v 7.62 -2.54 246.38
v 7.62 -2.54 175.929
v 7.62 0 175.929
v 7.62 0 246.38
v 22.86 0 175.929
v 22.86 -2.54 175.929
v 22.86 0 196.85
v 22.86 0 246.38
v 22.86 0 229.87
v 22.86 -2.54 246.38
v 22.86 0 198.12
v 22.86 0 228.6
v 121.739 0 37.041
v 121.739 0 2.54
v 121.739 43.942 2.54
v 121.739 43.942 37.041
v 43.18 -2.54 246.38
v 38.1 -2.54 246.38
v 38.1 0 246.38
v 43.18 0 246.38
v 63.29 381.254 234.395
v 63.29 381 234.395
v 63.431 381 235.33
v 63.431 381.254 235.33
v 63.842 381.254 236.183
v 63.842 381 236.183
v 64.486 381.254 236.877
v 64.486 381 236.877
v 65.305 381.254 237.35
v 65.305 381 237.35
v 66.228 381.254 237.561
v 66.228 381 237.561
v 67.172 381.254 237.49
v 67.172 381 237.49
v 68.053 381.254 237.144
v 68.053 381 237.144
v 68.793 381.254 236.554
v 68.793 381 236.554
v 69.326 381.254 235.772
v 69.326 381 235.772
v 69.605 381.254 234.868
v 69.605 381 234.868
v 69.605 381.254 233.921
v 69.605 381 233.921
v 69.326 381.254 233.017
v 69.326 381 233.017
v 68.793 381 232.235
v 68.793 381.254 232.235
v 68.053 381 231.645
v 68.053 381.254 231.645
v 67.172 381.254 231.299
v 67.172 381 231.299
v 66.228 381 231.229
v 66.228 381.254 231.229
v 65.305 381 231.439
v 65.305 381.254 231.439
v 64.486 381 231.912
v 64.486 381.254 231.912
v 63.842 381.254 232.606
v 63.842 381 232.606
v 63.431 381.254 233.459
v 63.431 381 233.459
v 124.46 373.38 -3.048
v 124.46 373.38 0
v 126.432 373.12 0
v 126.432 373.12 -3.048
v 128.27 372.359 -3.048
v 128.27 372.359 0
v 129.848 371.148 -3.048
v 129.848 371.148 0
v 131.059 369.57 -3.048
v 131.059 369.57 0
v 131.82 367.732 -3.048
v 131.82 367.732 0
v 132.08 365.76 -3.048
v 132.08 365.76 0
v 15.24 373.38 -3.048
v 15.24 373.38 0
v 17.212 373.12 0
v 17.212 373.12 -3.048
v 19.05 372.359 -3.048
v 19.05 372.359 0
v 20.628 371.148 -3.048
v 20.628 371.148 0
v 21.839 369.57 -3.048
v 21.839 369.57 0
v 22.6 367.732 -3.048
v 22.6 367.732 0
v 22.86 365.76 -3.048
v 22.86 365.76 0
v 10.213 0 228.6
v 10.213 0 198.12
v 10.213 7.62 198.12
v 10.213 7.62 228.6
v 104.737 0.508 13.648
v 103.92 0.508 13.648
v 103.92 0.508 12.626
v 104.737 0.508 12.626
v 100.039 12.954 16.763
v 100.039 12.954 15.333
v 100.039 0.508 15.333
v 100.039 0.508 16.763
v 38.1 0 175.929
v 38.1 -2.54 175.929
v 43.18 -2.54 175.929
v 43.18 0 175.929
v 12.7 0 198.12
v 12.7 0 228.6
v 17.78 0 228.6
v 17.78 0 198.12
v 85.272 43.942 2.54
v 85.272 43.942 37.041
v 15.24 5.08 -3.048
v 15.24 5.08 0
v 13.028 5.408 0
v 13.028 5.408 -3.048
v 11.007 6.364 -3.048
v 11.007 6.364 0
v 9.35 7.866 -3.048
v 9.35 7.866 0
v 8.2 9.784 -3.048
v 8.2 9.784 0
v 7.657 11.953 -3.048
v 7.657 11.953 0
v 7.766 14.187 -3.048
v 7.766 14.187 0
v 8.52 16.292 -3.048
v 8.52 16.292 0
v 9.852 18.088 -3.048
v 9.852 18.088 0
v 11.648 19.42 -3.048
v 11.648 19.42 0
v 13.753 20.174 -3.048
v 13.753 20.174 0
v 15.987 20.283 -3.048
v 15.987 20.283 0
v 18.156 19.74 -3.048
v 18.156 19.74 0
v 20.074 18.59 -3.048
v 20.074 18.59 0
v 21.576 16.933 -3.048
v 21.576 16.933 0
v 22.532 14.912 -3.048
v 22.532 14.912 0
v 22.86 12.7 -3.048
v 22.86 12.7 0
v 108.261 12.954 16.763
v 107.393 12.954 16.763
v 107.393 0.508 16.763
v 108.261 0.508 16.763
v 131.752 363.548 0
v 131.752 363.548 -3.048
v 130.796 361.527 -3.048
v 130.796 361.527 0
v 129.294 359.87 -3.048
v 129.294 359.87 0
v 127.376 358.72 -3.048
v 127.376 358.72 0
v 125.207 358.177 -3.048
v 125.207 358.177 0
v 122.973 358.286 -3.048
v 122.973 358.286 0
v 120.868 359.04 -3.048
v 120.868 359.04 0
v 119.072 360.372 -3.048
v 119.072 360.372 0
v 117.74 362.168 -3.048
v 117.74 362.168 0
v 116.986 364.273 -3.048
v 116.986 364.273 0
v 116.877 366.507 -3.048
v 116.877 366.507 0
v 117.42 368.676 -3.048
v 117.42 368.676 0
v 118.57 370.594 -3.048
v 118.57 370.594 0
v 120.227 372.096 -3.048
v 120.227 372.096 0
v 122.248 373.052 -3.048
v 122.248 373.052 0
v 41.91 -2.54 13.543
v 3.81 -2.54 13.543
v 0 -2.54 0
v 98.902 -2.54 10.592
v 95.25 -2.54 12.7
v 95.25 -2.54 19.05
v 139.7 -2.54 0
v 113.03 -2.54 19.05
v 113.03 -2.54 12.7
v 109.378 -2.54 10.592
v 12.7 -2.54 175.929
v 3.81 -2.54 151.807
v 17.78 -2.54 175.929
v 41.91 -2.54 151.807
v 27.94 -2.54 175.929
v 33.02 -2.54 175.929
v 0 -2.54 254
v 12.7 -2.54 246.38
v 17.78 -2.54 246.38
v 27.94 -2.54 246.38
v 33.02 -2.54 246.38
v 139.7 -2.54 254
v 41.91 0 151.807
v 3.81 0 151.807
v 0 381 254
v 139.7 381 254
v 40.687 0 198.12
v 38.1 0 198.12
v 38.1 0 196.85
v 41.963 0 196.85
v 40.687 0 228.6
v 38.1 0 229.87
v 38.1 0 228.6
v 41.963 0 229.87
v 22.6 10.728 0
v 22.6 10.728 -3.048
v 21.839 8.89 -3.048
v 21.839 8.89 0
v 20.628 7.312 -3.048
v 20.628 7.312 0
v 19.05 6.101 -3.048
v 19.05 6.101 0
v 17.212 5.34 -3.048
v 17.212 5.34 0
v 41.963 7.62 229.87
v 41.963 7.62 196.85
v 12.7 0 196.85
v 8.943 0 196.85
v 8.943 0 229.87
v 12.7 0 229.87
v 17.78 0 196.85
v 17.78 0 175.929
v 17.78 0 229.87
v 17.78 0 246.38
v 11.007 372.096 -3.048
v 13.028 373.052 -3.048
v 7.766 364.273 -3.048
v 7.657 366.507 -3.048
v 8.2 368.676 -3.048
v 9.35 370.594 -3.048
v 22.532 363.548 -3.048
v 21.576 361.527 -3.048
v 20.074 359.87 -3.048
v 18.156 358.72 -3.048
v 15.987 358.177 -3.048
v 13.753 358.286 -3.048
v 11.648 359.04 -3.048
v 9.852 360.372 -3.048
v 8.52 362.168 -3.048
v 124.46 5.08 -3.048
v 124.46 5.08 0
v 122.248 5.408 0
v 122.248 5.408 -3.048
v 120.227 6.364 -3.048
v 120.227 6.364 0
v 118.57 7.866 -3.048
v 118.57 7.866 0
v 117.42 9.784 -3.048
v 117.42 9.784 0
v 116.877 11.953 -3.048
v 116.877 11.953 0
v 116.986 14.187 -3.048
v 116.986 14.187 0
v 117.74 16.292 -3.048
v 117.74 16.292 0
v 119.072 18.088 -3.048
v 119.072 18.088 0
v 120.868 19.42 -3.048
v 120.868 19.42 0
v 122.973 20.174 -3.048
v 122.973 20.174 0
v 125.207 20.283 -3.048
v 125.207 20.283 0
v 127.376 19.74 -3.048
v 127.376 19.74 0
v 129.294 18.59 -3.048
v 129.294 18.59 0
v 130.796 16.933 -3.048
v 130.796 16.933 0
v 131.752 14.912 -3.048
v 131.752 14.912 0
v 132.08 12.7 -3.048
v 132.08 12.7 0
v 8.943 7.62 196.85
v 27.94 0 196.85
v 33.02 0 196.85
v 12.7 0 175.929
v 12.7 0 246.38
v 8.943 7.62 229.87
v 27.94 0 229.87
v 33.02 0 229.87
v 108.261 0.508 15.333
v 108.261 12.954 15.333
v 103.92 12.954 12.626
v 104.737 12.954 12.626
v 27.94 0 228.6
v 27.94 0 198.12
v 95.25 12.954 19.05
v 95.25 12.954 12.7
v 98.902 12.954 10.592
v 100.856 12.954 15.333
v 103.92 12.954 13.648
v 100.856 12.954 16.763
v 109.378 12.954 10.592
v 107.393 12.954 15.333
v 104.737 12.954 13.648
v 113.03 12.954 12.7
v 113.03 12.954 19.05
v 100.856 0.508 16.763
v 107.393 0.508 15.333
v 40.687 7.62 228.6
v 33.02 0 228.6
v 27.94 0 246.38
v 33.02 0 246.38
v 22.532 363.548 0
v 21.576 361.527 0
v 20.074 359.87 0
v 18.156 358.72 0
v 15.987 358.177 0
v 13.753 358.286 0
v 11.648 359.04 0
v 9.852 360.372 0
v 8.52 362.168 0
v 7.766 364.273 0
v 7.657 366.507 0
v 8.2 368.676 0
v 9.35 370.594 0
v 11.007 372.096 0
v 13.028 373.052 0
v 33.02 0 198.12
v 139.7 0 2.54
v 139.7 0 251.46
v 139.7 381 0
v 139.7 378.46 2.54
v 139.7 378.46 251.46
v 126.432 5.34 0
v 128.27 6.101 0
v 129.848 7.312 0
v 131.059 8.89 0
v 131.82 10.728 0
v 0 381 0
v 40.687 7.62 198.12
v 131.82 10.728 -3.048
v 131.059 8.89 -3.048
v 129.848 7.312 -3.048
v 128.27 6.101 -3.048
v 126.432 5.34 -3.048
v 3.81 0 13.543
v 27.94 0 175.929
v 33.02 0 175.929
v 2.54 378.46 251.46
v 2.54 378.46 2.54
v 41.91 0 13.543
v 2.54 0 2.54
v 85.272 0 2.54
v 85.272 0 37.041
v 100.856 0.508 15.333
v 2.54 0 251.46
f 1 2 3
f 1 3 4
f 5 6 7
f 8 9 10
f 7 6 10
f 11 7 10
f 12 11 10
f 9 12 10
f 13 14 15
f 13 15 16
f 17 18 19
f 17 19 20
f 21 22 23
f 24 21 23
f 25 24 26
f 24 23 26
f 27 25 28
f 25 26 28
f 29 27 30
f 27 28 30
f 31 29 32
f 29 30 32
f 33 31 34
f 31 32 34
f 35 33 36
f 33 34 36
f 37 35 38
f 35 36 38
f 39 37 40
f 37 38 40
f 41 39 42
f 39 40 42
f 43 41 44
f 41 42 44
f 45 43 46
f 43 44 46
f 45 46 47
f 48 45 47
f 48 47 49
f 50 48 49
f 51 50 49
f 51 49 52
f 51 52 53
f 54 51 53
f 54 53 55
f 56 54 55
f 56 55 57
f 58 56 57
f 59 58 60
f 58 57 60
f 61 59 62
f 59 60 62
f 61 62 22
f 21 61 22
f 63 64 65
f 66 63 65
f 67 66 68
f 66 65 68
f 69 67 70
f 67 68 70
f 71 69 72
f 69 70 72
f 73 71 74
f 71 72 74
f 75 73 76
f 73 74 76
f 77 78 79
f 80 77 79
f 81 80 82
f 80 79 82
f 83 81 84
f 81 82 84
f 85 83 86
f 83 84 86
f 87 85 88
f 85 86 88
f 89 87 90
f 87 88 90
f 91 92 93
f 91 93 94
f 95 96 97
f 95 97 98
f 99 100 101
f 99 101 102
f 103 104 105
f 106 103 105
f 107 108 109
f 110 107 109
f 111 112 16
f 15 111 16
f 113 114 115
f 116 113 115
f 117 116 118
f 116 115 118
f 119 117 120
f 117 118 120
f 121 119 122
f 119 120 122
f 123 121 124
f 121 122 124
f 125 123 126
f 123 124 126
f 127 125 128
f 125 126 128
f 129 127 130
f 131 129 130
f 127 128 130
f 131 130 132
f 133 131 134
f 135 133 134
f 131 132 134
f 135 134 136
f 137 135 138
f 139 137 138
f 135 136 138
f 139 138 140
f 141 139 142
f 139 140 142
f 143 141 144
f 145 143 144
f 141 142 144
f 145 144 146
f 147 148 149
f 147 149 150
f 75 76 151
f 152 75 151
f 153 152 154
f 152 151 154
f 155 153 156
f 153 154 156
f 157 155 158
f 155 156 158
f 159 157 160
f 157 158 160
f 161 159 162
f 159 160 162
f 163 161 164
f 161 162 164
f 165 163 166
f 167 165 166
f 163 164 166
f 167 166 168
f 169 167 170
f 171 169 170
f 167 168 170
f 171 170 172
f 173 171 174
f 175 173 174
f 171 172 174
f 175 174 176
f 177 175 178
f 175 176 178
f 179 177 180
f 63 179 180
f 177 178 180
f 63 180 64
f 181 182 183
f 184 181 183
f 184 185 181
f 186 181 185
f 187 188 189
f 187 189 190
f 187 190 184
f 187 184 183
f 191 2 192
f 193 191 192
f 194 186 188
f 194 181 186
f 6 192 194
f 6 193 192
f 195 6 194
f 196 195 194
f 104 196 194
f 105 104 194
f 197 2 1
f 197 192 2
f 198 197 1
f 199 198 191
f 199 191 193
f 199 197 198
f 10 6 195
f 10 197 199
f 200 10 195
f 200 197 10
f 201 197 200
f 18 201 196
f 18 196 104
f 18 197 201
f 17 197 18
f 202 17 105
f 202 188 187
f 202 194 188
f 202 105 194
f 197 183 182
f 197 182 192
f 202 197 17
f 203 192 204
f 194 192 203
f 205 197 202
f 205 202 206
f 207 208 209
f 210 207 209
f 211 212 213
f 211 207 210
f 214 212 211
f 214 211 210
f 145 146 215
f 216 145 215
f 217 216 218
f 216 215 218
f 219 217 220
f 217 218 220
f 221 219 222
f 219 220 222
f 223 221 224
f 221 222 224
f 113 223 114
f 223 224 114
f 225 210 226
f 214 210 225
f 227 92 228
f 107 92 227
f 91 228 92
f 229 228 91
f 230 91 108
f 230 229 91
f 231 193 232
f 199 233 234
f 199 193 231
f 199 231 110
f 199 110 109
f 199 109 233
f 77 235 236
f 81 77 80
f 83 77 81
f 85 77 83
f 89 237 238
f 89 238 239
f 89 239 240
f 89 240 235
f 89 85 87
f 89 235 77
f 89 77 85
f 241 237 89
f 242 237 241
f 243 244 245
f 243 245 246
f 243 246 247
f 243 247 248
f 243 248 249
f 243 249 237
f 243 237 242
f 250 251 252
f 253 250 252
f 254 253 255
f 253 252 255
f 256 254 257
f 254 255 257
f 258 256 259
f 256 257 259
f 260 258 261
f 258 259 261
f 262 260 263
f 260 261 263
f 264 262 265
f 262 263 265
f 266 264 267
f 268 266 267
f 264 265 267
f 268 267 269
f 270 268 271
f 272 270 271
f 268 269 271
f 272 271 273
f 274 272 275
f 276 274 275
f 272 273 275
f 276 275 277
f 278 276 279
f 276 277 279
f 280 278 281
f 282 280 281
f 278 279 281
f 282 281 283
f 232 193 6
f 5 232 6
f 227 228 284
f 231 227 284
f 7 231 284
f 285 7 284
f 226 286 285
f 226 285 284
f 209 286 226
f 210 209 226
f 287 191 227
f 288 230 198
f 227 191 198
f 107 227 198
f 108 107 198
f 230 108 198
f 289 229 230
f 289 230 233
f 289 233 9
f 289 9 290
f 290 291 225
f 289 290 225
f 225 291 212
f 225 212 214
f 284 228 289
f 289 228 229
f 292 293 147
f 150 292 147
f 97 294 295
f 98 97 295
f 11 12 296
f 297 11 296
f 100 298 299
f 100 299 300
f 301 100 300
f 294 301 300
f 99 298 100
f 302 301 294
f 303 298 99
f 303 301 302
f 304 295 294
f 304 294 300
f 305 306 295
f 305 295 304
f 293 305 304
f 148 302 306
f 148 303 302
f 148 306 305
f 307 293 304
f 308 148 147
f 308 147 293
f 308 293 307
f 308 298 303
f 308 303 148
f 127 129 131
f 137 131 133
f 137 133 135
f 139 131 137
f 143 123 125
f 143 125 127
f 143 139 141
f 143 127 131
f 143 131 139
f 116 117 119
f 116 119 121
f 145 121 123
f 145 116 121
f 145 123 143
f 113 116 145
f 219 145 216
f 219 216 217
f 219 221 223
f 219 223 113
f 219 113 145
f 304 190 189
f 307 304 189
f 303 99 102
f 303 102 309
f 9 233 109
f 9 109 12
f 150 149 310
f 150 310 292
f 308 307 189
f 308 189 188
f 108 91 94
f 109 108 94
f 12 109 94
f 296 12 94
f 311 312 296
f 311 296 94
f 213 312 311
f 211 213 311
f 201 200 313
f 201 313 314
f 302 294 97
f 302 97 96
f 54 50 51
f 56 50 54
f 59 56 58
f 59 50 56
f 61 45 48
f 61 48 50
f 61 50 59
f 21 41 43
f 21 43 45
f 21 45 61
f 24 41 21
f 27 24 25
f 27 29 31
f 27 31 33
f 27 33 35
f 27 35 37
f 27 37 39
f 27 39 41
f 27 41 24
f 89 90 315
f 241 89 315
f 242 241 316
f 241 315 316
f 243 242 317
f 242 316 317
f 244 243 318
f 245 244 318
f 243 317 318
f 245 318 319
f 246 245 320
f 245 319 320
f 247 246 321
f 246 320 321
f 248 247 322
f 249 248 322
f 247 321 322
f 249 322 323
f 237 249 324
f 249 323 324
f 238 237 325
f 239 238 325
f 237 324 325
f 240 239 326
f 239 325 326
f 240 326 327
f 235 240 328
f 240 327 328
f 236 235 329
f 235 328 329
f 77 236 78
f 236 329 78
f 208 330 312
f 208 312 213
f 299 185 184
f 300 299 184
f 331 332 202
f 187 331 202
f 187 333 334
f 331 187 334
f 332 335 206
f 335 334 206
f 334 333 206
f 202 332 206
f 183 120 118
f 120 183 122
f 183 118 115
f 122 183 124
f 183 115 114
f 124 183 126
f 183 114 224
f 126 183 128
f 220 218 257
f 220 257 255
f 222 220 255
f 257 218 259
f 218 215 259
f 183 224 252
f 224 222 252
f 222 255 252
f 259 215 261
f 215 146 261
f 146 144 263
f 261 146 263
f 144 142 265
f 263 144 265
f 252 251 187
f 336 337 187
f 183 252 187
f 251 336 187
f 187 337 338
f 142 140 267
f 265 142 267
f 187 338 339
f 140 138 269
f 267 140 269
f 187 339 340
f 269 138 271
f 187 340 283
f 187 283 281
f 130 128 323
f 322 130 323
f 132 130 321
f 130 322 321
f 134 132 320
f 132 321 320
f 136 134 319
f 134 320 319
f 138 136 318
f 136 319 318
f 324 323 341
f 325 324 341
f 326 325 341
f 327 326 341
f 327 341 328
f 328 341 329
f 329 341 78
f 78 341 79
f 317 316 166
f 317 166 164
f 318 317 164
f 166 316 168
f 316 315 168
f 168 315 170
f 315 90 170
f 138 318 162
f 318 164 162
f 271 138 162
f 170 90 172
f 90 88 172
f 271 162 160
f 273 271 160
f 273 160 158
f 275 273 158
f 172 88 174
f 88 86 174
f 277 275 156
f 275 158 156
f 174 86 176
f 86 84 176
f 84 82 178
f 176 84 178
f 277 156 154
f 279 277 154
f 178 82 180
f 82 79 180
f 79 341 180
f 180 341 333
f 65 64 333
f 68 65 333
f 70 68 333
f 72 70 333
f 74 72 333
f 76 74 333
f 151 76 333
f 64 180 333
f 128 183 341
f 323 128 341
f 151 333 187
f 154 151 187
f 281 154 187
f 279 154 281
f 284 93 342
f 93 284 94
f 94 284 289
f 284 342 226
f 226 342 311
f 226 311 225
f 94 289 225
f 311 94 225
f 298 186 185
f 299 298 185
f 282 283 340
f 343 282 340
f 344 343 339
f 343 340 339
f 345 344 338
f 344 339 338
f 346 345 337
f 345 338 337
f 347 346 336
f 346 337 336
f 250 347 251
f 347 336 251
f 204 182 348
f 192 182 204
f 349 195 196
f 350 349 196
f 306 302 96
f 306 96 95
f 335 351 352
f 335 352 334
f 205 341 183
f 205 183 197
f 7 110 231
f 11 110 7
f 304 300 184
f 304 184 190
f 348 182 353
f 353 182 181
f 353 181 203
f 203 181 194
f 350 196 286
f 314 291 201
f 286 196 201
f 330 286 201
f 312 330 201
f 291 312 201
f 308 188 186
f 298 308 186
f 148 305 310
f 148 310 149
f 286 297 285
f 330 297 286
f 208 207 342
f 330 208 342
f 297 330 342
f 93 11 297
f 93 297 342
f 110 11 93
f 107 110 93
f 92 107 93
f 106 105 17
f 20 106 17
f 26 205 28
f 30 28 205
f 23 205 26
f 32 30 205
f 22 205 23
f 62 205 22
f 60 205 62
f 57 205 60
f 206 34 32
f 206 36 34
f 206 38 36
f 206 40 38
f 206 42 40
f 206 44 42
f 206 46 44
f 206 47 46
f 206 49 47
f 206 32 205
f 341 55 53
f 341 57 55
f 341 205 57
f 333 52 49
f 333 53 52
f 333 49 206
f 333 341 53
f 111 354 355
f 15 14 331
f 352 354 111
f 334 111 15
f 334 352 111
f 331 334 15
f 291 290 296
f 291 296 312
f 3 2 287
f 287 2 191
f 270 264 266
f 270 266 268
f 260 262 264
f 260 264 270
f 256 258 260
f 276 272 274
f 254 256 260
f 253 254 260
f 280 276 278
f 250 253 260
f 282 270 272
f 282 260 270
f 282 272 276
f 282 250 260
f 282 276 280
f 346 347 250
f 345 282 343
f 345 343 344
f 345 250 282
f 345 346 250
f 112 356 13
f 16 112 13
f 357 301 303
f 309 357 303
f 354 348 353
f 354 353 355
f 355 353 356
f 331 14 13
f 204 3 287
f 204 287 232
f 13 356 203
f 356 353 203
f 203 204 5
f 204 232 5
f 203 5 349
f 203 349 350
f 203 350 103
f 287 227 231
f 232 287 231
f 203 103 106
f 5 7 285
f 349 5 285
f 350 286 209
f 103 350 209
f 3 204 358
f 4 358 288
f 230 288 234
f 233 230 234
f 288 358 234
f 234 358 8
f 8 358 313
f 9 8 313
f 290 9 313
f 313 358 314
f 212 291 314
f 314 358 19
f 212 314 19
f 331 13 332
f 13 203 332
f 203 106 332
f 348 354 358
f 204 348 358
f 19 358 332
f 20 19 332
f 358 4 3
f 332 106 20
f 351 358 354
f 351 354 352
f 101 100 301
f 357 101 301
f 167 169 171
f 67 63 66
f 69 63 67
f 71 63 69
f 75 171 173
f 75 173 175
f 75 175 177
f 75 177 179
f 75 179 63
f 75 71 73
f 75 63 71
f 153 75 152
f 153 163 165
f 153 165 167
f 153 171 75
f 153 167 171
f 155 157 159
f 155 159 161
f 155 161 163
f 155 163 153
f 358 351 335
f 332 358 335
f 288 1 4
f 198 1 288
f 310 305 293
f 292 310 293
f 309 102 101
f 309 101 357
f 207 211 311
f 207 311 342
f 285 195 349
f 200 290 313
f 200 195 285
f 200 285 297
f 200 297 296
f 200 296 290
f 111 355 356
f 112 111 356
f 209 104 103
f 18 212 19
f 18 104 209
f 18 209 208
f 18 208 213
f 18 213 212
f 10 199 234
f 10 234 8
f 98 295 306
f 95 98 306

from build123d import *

# Parameters (mm, degrees)
F0_W      = 139.7
F0_H      = 381
F1_DEPTH  = 2.54
F2_W      = 139.7
F2_H      = 254
F3_DEPTH  = 2.54
F4_W      = 381
F4_H      = 254
F5_DEPTH  = 2.54
F7_W      = 139.7
F7_H      = 254
F8_DEPTH  = 2.54
F10_W     = 139.7
F10_H     = 381
F11_DEPTH = 2.54
F12_W     = 5.08
F12_H     = 70.451392
F13_DEPTH = 2.54
F14_W     = 33.02
F14_H     = 33.02
F15_DEPTH = 7.62
F18_DEPTH = 2.54
F19_R     = 3.175
F20_DEPTH = 0.254
F22_DEPTH = 2.54
F24_DEPTH = 3.048
F25_W     = 38.1
F25_H     = 138.263544
F26_DEPTH = 2.54
F27_W     = 36.467261
F27_H     = 34.500528
F28_DEPTH = 43.942
F30_DEPTH = 12.954
F31_W     = 0.868231
F31_H     = 1.430023
F31_W_2   = 0.817157
F31_H_2   = 1.021446
F31_W_3   = 0.817158
F32_DEPTH = 12.446


with BuildPart() as f1:
    # F0 (on Top) → F1 (new body)
    with BuildSketch(Plane.XY):
        with Locations((69.85, 190.5)):
            Rectangle(F0_W, F0_H)
    extrude(amount=F1_DEPTH)

    # F2 (on Front) → F3 (join)
    with BuildSketch(Plane.XZ):
        with Locations((69.85, 127)):
            Rectangle(F2_W, F2_H)
    extrude(amount=F3_DEPTH)

    # F4 (on Right) → F5 (join)
    with BuildSketch(Plane.YZ):
        with Locations((190.5, 127)):
            Rectangle(F4_W, F4_H)
    extrude(amount=F5_DEPTH)

    # F7 (on offset) → F8 (join)
    with BuildSketch(Plane.XZ.offset(-381)):
        with Locations((69.85, 127)):
            Rectangle(F7_W, F7_H)
    extrude(amount=F8_DEPTH)

    # F10 (on offset) → F11 (join)
    with BuildSketch(Plane.XY.offset(254)):
        with Locations((69.85, 190.5)):
            Rectangle(F10_W, F10_H)
    extrude(amount=-F11_DEPTH)

    # F12 (on face) → F13 (cut)
    with BuildSketch(Plane.XZ.offset(2.54)):
        with Locations((40.64, 211.154304)):
            Rectangle(F12_W, F12_H)
        with Locations((30.48, 211.154304)):
            Rectangle(F12_W, F12_H)
        with Locations((20.32, 211.154304)):
            Rectangle(F12_W, F12_H)
        with Locations((10.16, 211.154304)):
            Rectangle(F12_W, F12_H)
    extrude(amount=-F13_DEPTH, mode=Mode.SUBTRACT)

    # F14 (on Front) → F15 (join)
    with BuildSketch(Plane.XZ):
        with Locations((25.453158, 213.36)):
            Rectangle(F14_W, F14_H)
        Polygon((10.213158, 228.6), (40.687077, 228.6), (40.687077, 198.12), (25.453158, 198.12), (10.213158, 198.12), align=None, mode=Mode.SUBTRACT)
    extrude(amount=-F15_DEPTH)

    # F17 (on offset) → F18 (cut)
    with BuildSketch(Plane.YZ.offset(139.7)):
        with BuildLine():
            Line((181.61, 234.763073), (181.61, 247.482779))
            ThreePointArc((181.61, 247.482779), (102.647567, 212.312433), (67.477221, 133.35))
            Line((67.477221, 133.35), (80.196927, 133.35))
            ThreePointArc((80.196927, 133.35), (111.627823, 203.332177), (181.61, 234.763073))
        make_face()
        with BuildLine():
            Line((181.61, 209.305407), (181.61, 222.038098))
            ThreePointArc((181.61, 222.038098), (120.608079, 194.351921), (92.921902, 133.35))
            Line((92.921902, 133.35), (105.654593, 133.35))
            ThreePointArc((105.654593, 133.35), (129.588335, 185.371665), (181.61, 209.305407))
        make_face()
        with BuildLine():
            Line((181.61, 183.796127), (181.61, 196.560765))
            ThreePointArc((181.61, 196.560765), (138.568591, 176.391409), (118.399235, 133.35))
            Line((118.399235, 133.35), (131.163873, 133.35))
            ThreePointArc((131.163873, 133.35), (147.548847, 167.411153), (181.61, 183.796127))
        make_face()
        with BuildLine():
            Line((181.61, 158.10852), (181.61, 170.994091))
            ThreePointArc((181.61, 170.994091), (156.529104, 158.430896), (143.965909, 133.35))
            Line((143.965909, 133.35), (156.85148, 133.35))
            ThreePointArc((156.85148, 133.35), (165.50936, 149.45064), (181.61, 158.10852))
        make_face()
        with BuildLine():
            Line((181.61, 133.35), (181.61, 144.960512))
            ThreePointArc((181.61, 144.960512), (174.489616, 140.470384), (169.999488, 133.35))
            Line((169.999488, 133.35), (181.61, 133.35))
        make_face()
        with BuildLine():
            Line((194.31, 133.35), (205.920512, 133.35))
            ThreePointArc((205.920512, 133.35), (201.430384, 140.470384), (194.31, 144.960512))
            Line((194.31, 144.960512), (194.31, 133.35))
        make_face()
        with BuildLine():
            Line((219.06852, 133.35), (231.954091, 133.35))
            ThreePointArc((231.954091, 133.35), (219.390896, 158.430896), (194.31, 170.994091))
            Line((194.31, 170.994091), (194.31, 158.10852))
            ThreePointArc((194.31, 158.10852), (210.41064, 149.45064), (219.06852, 133.35))
        make_face()
        with BuildLine():
            Line((244.756127, 133.35), (257.520765, 133.35))
            ThreePointArc((257.520765, 133.35), (237.351409, 176.391409), (194.31, 196.560765))
            Line((194.31, 196.560765), (194.31, 183.796127))
            ThreePointArc((194.31, 183.796127), (228.371153, 167.411153), (244.756127, 133.35))
        make_face()
        with BuildLine():
            Line((270.265407, 133.35), (282.998098, 133.35))
            ThreePointArc((282.998098, 133.35), (255.311921, 194.351921), (194.31, 222.038098))
            Line((194.31, 222.038098), (194.31, 209.305407))
            ThreePointArc((194.31, 209.305407), (246.331665, 185.371665), (270.265407, 133.35))
        make_face()
        with BuildLine():
            Line((295.723073, 133.35), (308.442779, 133.35))
            ThreePointArc((308.442779, 133.35), (273.272433, 212.312433), (194.31, 247.482779))
            Line((194.31, 247.482779), (194.31, 234.763073))
            ThreePointArc((194.31, 234.763073), (264.292177, 203.332177), (295.723073, 133.35))
        make_face()
        with BuildLine():
            ThreePointArc((194.31, 6.517221), (273.272433, 41.687567), (308.442779, 120.65))
            Line((308.442779, 120.65), (295.723073, 120.65))
            ThreePointArc((295.723073, 120.65), (264.292177, 50.667823), (194.31, 19.236927))
            Line((194.31, 19.236927), (194.31, 6.517221))
        make_face()
        with BuildLine():
            ThreePointArc((194.31, 31.961902), (255.311921, 59.648079), (282.998098, 120.65))
            Line((282.998098, 120.65), (270.265407, 120.65))
            ThreePointArc((270.265407, 120.65), (246.331665, 68.628335), (194.31, 44.694593))
            Line((194.31, 44.694593), (194.31, 31.961902))
        make_face()
        with BuildLine():
            ThreePointArc((194.31, 57.439235), (237.351409, 77.608591), (257.520765, 120.65))
            Line((257.520765, 120.65), (244.756127, 120.65))
            ThreePointArc((244.756127, 120.65), (228.371153, 86.588847), (194.31, 70.203873))
            Line((194.31, 70.203873), (194.31, 57.439235))
        make_face()
        with BuildLine():
            ThreePointArc((194.31, 83.005909), (219.390896, 95.569104), (231.954091, 120.65))
            Line((231.954091, 120.65), (219.06852, 120.65))
            ThreePointArc((219.06852, 120.65), (210.41064, 104.54936), (194.31, 95.89148))
            Line((194.31, 95.89148), (194.31, 83.005909))
        make_face()
        with BuildLine():
            ThreePointArc((194.31, 109.039488), (201.430384, 113.529616), (205.920512, 120.65))
            Line((205.920512, 120.65), (194.31, 120.65))
            Line((194.31, 120.65), (194.31, 109.039488))
        make_face()
        with BuildLine():
            ThreePointArc((67.477221, 120.65), (102.647567, 41.687567), (181.61, 6.517221))
            Line((181.61, 6.517221), (181.61, 19.236927))
            ThreePointArc((181.61, 19.236927), (111.627823, 50.667823), (80.196927, 120.65))
            Line((80.196927, 120.65), (67.477221, 120.65))
        make_face()
        with BuildLine():
            ThreePointArc((92.921902, 120.65), (120.608079, 59.648079), (181.61, 31.961902))
            Line((181.61, 31.961902), (181.61, 44.694593))
            ThreePointArc((181.61, 44.694593), (129.588335, 68.628335), (105.654593, 120.65))
            Line((105.654593, 120.65), (92.921902, 120.65))
        make_face()
        with BuildLine():
            ThreePointArc((118.399235, 120.65), (138.568591, 77.608591), (181.61, 57.439235))
            Line((181.61, 57.439235), (181.61, 70.203873))
            ThreePointArc((181.61, 70.203873), (147.548847, 86.588847), (131.163873, 120.65))
            Line((131.163873, 120.65), (118.399235, 120.65))
        make_face()
        with BuildLine():
            ThreePointArc((143.965909, 120.65), (156.529104, 95.569104), (181.61, 83.005909))
            Line((181.61, 83.005909), (181.61, 95.89148))
            ThreePointArc((181.61, 95.89148), (165.50936, 104.54936), (156.85148, 120.65))
            Line((156.85148, 120.65), (143.965909, 120.65))
        make_face()
        with BuildLine():
            ThreePointArc((169.999488, 120.65), (174.489616, 113.529616), (181.61, 109.039488))
            Line((181.61, 109.039488), (181.61, 120.65))
            Line((181.61, 120.65), (169.999488, 120.65))
        make_face()
    extrude(amount=-F18_DEPTH, mode=Mode.SUBTRACT)

    # F19 (on face) → F20 (join)
    with BuildSketch(Plane(origin=(0, 381, 0), x_dir=(-1, 0, 0), z_dir=(0, 1, 0))):
        with Locations((-66.46537, 234.394625)):
            Circle(F19_R)
    extrude(amount=F20_DEPTH)

    # F21 (on face) → F22 (cut)
    with BuildSketch(Plane.XZ.offset(2.54)):
        Polygon((95.25, 19.05), (95.25, 12.7), (98.90151, 10.5918), (109.37849, 10.5918), (113.03, 12.7), (113.03, 19.05), align=None)
    extrude(amount=-F22_DEPTH, mode=Mode.SUBTRACT)

    # F23 (on face) → F24 (join)
    with BuildSketch(Plane(origin=(0, 0, 0), x_dir=(1, 0, 0), z_dir=(0, 0, -1))):
        with BuildLine():
            ThreePointArc((22.86, -365.76), (9.851846, -360.371846), (15.24, -373.38))
            ThreePointArc((15.24, -373.38), (20.628154, -371.148154), (22.86, -365.76))
        make_face()
        with BuildLine():
            ThreePointArc((132.08, -365.76), (119.071846, -360.371846), (124.46, -373.38))
            ThreePointArc((124.46, -373.38), (129.848154, -371.148154), (132.08, -365.76))
        make_face()
        with BuildLine():
            ThreePointArc((132.08, -12.7), (129.848154, -7.311846), (124.46, -5.08))
            ThreePointArc((124.46, -5.08), (119.071846, -18.088154), (132.08, -12.7))
        make_face()
        with BuildLine():
            ThreePointArc((22.86, -12.7), (20.628154, -7.311846), (15.24, -5.08))
            ThreePointArc((15.24, -5.08), (9.851846, -18.088154), (22.86, -12.7))
        make_face()
    extrude(amount=F24_DEPTH)

    # F25 (on face) → F26 (cut)
    with BuildSketch(Plane.XZ.offset(2.54)):
        with Locations((22.86, 82.675149)):
            Rectangle(F25_W, F25_H)
    extrude(amount=-F26_DEPTH, mode=Mode.SUBTRACT)

    # F27 (on Front) → F28 (join)
    with BuildSketch(Plane.XZ):
        with Locations((103.505354, 19.790264)):
            Rectangle(F27_W, F27_H)
    extrude(amount=-F28_DEPTH)

    # F29 (on face) → F30 (cut)
    with BuildSketch(Plane.XZ):
        Polygon((113.03, 12.7), (113.03, 19.05), (95.25, 19.05), (95.25, 12.7), (98.90151, 10.5918), (109.37849, 10.5918), align=None)
    extrude(amount=-F30_DEPTH, mode=Mode.SUBTRACT)

    # F31 (on face) → F32 (join)
    with BuildSketch(Plane.XZ.offset(-12.954)):
        with Locations((107.827298, 16.047901)):
            Rectangle(F31_W, F31_H)
        with Locations((104.328845, 13.136782)):
            Rectangle(F31_W_2, F31_H_2)
        with Locations((100.447353, 16.047901)):
            Rectangle(F31_W_3, F31_H)
    extrude(amount=F32_DEPTH)


solid = f1.part
